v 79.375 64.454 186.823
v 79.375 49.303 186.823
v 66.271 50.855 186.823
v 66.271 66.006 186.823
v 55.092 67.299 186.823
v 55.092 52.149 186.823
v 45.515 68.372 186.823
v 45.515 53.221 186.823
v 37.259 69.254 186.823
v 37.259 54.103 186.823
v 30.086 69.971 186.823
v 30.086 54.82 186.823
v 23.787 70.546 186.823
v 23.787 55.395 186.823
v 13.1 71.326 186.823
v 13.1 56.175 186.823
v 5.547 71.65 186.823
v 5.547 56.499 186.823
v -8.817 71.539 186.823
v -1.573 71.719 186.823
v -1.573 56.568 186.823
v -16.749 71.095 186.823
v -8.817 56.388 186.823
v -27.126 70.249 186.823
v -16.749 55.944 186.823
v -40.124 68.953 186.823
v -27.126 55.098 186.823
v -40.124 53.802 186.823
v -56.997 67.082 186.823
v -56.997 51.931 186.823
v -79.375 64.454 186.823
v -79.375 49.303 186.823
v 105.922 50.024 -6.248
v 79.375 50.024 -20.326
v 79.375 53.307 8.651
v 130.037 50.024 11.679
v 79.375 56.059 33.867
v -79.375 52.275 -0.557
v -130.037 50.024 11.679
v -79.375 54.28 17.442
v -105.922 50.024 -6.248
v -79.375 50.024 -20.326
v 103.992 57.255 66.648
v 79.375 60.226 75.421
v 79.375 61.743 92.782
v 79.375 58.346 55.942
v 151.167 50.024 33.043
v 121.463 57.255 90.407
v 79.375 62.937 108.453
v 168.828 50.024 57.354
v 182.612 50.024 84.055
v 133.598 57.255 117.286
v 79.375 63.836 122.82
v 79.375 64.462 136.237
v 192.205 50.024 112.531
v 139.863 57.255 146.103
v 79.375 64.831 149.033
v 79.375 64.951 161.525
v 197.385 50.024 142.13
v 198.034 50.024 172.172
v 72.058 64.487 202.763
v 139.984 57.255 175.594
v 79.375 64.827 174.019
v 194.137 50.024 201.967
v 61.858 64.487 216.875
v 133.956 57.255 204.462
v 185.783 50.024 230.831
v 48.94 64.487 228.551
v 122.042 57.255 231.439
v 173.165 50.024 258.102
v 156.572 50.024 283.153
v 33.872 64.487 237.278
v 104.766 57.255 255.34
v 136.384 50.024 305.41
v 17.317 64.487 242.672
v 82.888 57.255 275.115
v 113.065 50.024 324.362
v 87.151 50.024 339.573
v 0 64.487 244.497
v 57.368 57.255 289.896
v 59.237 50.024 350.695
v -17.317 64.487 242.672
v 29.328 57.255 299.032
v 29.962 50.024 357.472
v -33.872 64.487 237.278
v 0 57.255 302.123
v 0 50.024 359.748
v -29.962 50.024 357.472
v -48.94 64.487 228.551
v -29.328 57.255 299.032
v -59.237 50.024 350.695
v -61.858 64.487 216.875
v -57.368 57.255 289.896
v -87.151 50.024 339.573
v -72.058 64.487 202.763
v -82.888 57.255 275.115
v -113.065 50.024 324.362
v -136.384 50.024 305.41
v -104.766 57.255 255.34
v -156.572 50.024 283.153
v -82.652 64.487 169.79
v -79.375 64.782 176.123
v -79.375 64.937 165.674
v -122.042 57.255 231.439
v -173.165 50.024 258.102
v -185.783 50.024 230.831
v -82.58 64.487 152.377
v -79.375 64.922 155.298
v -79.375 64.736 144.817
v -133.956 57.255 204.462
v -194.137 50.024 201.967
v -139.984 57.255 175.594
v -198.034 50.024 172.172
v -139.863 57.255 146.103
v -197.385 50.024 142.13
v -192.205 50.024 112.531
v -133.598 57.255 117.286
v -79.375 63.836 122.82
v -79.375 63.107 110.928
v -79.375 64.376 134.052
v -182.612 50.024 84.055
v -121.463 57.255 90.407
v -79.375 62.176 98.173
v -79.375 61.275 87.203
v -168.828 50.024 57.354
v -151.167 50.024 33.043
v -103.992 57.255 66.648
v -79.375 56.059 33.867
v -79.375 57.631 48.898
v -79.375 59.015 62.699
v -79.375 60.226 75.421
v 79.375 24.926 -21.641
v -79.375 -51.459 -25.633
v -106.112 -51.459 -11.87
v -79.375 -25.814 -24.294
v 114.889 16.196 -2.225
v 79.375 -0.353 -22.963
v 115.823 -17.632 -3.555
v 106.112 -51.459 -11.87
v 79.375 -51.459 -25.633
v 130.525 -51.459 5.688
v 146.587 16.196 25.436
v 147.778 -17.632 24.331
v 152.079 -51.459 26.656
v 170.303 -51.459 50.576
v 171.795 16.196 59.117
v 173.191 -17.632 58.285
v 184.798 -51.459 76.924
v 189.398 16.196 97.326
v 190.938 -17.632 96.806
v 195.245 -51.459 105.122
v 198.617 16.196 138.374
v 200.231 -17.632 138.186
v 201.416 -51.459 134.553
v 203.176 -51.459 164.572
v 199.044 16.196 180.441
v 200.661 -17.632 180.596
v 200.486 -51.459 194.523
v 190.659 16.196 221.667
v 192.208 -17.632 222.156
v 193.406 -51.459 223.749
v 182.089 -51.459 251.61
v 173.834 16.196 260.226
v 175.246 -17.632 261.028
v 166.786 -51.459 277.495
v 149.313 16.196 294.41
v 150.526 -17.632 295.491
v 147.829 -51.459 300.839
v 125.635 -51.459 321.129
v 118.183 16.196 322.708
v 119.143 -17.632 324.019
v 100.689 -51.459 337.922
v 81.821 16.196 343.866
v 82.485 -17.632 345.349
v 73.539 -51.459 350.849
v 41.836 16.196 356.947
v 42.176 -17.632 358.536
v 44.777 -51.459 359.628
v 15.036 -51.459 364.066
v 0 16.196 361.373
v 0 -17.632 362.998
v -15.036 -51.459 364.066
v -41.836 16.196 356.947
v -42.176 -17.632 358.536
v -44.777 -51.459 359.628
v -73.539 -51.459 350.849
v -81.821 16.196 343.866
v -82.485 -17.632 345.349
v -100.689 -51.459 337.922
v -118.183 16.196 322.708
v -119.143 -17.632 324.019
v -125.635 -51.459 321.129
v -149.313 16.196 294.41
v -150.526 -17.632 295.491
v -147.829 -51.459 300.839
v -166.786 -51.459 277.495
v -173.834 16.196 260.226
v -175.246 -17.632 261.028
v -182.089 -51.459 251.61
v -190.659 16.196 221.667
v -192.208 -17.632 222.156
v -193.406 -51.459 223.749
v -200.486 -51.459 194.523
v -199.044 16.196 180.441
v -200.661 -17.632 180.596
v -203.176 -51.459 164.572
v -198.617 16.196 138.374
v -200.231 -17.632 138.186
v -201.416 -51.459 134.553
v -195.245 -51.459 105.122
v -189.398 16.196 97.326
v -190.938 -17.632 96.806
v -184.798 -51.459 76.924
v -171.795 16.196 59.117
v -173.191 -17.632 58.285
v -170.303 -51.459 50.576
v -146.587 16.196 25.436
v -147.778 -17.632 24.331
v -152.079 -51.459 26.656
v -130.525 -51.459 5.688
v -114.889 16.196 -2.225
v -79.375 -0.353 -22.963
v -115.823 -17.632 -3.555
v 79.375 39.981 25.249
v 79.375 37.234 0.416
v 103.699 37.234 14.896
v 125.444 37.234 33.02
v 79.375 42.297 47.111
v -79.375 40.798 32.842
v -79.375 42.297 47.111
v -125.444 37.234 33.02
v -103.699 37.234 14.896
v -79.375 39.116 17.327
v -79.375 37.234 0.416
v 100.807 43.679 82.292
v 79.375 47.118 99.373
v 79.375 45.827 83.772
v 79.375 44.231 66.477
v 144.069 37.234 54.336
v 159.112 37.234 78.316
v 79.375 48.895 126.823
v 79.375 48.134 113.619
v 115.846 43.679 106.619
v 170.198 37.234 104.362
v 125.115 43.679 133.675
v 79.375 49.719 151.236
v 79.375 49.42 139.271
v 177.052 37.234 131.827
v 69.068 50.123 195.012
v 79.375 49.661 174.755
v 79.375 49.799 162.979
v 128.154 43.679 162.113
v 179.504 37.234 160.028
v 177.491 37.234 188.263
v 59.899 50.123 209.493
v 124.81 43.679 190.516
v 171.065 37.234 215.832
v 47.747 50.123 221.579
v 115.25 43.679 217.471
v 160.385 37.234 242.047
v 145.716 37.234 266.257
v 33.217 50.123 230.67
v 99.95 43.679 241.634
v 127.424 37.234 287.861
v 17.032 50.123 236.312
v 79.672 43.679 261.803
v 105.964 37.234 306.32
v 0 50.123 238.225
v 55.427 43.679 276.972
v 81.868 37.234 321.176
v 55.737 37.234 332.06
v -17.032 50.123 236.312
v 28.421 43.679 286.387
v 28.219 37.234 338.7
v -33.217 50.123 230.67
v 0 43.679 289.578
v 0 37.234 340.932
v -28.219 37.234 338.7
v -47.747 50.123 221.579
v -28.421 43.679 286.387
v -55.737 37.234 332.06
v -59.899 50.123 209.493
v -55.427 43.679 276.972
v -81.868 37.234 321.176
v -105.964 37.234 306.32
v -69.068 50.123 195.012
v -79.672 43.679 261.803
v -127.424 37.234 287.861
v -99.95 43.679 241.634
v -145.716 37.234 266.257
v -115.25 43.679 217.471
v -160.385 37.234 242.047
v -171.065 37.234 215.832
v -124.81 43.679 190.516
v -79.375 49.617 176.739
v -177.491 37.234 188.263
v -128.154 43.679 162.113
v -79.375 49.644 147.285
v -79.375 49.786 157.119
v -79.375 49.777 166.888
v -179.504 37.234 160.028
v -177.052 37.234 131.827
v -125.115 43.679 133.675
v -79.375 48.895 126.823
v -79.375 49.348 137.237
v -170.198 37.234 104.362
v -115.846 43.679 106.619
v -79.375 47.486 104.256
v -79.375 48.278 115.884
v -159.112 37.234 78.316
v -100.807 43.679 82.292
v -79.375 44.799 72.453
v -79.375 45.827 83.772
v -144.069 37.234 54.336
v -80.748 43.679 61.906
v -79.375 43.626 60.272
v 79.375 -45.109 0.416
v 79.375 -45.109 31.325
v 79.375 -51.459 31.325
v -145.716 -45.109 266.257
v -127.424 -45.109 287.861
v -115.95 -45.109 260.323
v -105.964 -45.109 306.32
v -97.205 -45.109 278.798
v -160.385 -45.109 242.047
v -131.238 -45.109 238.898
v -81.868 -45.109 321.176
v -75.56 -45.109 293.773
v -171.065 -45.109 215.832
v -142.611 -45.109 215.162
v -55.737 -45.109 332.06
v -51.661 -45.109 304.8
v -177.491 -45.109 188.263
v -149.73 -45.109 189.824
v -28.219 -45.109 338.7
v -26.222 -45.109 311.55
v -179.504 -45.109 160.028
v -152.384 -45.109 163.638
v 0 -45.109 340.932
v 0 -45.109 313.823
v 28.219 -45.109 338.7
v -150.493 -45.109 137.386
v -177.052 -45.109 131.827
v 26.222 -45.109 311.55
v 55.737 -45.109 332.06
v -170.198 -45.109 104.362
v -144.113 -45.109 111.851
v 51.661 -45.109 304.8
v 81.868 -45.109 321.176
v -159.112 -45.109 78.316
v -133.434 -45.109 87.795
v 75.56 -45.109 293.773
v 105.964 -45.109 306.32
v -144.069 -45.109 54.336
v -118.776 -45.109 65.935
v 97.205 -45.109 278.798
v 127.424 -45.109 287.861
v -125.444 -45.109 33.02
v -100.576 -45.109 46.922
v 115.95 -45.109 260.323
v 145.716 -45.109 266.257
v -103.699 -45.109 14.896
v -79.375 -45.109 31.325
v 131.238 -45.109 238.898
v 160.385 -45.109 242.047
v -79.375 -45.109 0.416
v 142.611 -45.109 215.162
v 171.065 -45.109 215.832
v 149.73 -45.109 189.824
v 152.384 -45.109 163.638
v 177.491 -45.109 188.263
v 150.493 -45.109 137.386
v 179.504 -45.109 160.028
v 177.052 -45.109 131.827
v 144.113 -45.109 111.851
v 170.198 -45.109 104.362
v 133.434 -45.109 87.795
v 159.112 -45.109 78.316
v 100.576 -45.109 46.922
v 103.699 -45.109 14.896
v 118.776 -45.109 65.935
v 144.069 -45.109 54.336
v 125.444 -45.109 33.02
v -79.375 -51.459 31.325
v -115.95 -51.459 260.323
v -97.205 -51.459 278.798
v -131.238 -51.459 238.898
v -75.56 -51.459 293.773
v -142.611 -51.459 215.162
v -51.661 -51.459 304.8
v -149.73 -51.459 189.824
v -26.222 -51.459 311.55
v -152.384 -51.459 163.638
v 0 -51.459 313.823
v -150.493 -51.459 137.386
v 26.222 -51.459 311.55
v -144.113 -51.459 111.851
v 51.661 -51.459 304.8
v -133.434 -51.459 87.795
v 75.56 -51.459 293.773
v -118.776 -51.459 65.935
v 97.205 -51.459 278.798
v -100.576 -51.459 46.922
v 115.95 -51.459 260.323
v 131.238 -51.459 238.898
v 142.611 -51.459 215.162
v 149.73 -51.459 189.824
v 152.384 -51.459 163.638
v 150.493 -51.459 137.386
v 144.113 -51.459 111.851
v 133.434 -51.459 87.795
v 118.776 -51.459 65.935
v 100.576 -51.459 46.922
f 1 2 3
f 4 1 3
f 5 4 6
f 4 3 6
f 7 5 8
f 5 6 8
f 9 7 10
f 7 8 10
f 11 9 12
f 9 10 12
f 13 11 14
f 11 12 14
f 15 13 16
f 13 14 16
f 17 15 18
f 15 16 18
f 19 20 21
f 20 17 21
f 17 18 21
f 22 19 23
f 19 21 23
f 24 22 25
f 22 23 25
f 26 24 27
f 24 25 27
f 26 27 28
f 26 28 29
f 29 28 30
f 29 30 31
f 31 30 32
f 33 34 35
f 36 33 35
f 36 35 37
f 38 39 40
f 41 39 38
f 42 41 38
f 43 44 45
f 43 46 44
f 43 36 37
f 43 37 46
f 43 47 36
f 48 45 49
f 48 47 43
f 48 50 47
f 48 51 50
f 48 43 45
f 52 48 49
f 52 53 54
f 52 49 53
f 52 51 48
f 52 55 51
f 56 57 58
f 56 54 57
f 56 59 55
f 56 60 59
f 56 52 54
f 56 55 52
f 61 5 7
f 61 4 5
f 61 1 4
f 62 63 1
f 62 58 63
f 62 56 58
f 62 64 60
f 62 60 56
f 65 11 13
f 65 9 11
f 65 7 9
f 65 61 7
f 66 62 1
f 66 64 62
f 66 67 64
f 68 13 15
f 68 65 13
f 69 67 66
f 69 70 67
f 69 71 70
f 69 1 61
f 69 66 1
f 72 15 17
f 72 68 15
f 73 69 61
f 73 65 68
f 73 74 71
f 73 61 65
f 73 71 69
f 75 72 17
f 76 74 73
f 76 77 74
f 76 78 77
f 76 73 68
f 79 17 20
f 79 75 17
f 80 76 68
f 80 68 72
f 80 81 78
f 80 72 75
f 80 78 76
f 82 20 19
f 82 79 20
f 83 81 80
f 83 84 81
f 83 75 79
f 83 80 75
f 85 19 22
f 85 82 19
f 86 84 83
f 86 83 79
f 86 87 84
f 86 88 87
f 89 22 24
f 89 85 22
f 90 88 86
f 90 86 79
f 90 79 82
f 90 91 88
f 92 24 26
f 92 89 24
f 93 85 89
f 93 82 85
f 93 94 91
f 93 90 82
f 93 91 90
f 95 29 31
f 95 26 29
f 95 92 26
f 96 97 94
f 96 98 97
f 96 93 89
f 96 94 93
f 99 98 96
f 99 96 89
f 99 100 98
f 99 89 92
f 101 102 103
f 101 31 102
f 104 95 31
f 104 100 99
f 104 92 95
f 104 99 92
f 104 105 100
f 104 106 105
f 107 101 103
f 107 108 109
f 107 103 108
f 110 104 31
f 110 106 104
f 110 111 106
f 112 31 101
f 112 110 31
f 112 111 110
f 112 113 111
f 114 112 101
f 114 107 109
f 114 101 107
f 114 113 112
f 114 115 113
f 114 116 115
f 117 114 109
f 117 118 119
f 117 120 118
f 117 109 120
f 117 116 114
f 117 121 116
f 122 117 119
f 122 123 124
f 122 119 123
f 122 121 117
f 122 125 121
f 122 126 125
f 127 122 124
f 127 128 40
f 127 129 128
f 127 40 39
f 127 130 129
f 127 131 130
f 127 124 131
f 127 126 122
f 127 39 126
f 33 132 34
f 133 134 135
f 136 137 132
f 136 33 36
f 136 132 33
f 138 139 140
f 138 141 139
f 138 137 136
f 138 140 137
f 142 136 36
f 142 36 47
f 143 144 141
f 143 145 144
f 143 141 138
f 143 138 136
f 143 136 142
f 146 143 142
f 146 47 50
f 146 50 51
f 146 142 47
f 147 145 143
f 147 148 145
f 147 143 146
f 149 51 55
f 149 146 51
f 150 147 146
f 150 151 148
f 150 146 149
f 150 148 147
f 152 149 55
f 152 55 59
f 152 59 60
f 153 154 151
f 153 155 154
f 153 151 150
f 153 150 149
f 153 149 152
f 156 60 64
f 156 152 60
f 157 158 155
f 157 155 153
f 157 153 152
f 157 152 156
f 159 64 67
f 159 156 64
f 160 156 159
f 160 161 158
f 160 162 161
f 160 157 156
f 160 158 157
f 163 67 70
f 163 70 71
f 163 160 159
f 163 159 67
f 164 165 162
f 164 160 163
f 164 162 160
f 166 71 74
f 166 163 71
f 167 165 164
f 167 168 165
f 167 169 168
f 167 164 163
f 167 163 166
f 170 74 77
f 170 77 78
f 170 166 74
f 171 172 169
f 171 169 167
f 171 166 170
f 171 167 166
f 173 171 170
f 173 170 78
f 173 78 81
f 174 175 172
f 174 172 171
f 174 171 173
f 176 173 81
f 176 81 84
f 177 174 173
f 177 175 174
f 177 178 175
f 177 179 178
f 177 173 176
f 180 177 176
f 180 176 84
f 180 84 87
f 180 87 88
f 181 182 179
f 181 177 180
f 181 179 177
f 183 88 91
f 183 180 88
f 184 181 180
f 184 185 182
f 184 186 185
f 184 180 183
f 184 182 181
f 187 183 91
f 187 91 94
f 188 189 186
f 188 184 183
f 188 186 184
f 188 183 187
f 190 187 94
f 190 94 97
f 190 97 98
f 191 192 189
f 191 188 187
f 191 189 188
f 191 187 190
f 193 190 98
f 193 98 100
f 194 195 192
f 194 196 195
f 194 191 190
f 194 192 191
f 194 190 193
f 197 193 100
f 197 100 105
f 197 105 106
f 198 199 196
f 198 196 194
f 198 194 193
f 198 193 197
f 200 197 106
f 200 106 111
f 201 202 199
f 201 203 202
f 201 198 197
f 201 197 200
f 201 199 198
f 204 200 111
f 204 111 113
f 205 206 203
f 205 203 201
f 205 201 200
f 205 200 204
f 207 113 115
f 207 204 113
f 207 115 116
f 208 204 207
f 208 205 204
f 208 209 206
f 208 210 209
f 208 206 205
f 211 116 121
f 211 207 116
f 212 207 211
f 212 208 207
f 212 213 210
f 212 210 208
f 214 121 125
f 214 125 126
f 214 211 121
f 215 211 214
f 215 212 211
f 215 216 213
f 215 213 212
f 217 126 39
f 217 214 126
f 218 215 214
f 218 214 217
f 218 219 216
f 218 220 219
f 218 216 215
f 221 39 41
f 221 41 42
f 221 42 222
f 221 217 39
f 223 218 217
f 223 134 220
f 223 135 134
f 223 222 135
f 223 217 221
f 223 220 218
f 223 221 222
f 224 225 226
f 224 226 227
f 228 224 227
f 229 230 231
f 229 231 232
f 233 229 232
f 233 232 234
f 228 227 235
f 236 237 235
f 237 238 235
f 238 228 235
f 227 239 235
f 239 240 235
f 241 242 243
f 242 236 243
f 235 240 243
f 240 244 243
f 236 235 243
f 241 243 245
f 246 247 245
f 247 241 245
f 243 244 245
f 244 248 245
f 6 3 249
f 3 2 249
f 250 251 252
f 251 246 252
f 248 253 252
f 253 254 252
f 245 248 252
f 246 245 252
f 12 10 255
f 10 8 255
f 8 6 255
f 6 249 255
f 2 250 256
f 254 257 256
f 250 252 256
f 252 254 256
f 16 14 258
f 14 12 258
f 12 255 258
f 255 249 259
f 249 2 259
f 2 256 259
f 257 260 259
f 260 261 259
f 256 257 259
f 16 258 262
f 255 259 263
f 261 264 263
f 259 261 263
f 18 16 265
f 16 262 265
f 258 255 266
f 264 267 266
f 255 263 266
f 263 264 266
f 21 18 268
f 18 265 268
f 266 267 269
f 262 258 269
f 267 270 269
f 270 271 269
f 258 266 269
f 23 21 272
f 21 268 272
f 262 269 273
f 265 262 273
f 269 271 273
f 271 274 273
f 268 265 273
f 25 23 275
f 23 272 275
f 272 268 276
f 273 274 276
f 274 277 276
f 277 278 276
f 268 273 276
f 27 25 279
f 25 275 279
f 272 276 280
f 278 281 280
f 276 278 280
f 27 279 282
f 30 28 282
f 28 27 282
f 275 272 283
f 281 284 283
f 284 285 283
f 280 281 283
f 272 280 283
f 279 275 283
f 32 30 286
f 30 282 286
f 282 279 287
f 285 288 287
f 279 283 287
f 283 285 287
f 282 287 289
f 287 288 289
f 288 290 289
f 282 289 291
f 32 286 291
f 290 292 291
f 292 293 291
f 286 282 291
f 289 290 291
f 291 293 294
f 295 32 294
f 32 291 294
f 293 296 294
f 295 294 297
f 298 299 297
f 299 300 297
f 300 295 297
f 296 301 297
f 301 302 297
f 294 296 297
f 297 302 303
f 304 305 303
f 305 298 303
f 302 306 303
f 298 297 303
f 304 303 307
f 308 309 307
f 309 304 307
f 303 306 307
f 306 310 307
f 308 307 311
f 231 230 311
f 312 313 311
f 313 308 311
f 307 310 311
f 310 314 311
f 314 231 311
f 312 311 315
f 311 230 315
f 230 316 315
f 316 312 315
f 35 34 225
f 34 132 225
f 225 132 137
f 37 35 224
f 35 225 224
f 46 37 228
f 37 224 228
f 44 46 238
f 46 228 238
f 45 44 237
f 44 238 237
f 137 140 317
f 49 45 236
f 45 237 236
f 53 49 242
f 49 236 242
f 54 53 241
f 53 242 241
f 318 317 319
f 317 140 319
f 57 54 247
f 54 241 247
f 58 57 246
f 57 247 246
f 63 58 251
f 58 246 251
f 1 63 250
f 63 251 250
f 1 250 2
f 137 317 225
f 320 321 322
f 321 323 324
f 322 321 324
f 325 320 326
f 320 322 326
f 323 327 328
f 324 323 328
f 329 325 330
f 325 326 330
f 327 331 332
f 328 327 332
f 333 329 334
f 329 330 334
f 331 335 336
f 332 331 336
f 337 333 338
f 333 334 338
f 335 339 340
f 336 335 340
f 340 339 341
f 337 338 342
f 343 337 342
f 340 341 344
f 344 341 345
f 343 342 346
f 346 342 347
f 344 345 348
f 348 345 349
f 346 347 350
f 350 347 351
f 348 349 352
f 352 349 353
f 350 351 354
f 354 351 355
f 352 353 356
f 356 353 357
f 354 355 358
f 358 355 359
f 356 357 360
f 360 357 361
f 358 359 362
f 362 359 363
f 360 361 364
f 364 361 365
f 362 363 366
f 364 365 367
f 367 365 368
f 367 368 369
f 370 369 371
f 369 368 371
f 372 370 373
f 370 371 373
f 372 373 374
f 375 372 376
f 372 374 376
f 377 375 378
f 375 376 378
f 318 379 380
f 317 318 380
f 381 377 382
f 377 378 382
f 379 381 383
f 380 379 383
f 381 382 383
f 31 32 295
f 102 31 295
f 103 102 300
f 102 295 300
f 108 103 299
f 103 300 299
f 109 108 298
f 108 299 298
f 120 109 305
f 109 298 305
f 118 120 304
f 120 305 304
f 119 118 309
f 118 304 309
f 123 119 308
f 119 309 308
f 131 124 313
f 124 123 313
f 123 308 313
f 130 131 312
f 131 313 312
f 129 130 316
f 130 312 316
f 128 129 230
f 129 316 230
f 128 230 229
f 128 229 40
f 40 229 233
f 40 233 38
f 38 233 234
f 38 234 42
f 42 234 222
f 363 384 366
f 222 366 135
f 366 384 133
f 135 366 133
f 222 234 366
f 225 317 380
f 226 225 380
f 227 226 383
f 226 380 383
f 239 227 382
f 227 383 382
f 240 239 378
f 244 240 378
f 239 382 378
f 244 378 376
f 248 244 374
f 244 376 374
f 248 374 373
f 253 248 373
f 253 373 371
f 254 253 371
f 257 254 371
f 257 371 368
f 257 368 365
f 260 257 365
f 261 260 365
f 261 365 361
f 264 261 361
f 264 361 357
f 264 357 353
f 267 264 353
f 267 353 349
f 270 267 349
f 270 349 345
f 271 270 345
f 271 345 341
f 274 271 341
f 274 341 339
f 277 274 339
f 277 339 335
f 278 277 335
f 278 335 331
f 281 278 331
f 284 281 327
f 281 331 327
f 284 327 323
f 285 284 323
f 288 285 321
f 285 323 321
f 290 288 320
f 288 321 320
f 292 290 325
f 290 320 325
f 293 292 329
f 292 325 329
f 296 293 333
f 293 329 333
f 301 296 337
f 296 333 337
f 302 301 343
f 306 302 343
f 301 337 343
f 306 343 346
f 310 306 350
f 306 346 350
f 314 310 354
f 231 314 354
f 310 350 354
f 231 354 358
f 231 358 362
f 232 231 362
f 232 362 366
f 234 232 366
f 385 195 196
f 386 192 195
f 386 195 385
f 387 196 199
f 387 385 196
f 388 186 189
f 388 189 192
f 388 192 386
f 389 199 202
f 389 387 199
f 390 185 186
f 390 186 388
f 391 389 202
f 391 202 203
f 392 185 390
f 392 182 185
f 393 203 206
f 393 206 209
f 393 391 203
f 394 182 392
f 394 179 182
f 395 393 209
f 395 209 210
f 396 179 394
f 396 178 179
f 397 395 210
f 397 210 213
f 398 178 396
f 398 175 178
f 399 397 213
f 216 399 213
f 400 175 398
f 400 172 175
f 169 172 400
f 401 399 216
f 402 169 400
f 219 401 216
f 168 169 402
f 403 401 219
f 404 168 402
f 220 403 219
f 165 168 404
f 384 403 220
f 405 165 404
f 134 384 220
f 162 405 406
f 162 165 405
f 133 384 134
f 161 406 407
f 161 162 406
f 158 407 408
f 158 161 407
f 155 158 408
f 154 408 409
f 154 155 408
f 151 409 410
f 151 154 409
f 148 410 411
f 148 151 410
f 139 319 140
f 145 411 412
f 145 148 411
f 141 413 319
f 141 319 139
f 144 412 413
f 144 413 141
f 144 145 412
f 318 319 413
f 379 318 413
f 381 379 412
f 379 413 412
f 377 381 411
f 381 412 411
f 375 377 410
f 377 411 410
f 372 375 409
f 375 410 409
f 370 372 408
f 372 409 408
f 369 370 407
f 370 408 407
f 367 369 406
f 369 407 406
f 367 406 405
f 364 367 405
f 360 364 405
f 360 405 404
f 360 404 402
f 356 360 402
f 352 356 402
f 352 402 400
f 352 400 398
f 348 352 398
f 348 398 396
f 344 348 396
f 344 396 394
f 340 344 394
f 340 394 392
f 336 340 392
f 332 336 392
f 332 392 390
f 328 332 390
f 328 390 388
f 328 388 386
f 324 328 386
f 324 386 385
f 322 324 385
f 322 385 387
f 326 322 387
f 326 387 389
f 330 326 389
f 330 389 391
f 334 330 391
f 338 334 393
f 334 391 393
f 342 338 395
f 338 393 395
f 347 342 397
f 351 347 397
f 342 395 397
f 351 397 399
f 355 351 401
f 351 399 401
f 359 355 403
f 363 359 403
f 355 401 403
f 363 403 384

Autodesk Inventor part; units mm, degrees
ref_plane "YZ Plane" through (0, 0, 0) normal (1, 0, 0) x (0, 1, 0)
ref_plane "XZ Plane" through (0, 0, 0) normal (0, 1, 0) x (-1, 0, 0)
ref_plane "XY Plane" through (0, 0, 0) normal (0, 0, 1) x (1, 0, 0)
sketch "Sketch1" plane through (0, 0, 0) normal (1, 0, 0) x (0, 1, 0)
  line L0 (74.9127, 161.4228) -> (59.7618, 161.4228)
  line L1 (-45.1093, -18.0862) -> (-45.1093, 9.0228)
  line L2 (-45.1093, 9.0228) -> (-51.4593, 9.0228)
  line L3 (-51.4593, 9.0228) -> (-51.4593, -41.7772)
  line L4 (37.2342, -18.0862) -> (-45.1093, -18.0862)
  line L5 (-51.4593, -41.7772) -> (50.0237, -36.9026)
  line L6 (50.0237, -36.9026) -> (74.9127, 161.4228)
  line L7 (59.7618, 161.4228) -> (37.2342, -18.0862)
  point P0 (0, 0)
  dimension "d0" = 101.6
  dimension "d2" = 50.8
  dimension "d3" = 6.35
  dimension "d4" = 87.25
revolve "Revolution1" add sketch "Sketch1" angle 360 about axis through (0, 74.9127, 161.4228) along (0, -1, 0)
sketch "Sketch2" plane through (0, -51.4593, 161.4228) normal (0, -1, 0) x (1, 0, 0)
  line L0 (79.375, 25.4) -> (-79.375, 25.4)
  line L1 (-79.375, 25.4) -> (-79.375, -278.9965)
  line L2 (-79.375, -278.9965) -> (79.375, -278.9965)
  line L3 (79.375, -278.9965) -> (79.375, 25.4)
  circle A0 centre (0, 0) radius 203.2 projected
  point P0 (0, -161.4228)
  dimension "d6" = 158.75
  dimension "d7" = 79.375
  dimension "d8" = 25.4
extrude "Extrusion1" cut sketch "Sketch2" against normal blind 127 contours L3 A0 L1 L0 | L3 L2 L1 A0 picked at (-3.0192, -50.7327)
properties part number "FullTopx"
